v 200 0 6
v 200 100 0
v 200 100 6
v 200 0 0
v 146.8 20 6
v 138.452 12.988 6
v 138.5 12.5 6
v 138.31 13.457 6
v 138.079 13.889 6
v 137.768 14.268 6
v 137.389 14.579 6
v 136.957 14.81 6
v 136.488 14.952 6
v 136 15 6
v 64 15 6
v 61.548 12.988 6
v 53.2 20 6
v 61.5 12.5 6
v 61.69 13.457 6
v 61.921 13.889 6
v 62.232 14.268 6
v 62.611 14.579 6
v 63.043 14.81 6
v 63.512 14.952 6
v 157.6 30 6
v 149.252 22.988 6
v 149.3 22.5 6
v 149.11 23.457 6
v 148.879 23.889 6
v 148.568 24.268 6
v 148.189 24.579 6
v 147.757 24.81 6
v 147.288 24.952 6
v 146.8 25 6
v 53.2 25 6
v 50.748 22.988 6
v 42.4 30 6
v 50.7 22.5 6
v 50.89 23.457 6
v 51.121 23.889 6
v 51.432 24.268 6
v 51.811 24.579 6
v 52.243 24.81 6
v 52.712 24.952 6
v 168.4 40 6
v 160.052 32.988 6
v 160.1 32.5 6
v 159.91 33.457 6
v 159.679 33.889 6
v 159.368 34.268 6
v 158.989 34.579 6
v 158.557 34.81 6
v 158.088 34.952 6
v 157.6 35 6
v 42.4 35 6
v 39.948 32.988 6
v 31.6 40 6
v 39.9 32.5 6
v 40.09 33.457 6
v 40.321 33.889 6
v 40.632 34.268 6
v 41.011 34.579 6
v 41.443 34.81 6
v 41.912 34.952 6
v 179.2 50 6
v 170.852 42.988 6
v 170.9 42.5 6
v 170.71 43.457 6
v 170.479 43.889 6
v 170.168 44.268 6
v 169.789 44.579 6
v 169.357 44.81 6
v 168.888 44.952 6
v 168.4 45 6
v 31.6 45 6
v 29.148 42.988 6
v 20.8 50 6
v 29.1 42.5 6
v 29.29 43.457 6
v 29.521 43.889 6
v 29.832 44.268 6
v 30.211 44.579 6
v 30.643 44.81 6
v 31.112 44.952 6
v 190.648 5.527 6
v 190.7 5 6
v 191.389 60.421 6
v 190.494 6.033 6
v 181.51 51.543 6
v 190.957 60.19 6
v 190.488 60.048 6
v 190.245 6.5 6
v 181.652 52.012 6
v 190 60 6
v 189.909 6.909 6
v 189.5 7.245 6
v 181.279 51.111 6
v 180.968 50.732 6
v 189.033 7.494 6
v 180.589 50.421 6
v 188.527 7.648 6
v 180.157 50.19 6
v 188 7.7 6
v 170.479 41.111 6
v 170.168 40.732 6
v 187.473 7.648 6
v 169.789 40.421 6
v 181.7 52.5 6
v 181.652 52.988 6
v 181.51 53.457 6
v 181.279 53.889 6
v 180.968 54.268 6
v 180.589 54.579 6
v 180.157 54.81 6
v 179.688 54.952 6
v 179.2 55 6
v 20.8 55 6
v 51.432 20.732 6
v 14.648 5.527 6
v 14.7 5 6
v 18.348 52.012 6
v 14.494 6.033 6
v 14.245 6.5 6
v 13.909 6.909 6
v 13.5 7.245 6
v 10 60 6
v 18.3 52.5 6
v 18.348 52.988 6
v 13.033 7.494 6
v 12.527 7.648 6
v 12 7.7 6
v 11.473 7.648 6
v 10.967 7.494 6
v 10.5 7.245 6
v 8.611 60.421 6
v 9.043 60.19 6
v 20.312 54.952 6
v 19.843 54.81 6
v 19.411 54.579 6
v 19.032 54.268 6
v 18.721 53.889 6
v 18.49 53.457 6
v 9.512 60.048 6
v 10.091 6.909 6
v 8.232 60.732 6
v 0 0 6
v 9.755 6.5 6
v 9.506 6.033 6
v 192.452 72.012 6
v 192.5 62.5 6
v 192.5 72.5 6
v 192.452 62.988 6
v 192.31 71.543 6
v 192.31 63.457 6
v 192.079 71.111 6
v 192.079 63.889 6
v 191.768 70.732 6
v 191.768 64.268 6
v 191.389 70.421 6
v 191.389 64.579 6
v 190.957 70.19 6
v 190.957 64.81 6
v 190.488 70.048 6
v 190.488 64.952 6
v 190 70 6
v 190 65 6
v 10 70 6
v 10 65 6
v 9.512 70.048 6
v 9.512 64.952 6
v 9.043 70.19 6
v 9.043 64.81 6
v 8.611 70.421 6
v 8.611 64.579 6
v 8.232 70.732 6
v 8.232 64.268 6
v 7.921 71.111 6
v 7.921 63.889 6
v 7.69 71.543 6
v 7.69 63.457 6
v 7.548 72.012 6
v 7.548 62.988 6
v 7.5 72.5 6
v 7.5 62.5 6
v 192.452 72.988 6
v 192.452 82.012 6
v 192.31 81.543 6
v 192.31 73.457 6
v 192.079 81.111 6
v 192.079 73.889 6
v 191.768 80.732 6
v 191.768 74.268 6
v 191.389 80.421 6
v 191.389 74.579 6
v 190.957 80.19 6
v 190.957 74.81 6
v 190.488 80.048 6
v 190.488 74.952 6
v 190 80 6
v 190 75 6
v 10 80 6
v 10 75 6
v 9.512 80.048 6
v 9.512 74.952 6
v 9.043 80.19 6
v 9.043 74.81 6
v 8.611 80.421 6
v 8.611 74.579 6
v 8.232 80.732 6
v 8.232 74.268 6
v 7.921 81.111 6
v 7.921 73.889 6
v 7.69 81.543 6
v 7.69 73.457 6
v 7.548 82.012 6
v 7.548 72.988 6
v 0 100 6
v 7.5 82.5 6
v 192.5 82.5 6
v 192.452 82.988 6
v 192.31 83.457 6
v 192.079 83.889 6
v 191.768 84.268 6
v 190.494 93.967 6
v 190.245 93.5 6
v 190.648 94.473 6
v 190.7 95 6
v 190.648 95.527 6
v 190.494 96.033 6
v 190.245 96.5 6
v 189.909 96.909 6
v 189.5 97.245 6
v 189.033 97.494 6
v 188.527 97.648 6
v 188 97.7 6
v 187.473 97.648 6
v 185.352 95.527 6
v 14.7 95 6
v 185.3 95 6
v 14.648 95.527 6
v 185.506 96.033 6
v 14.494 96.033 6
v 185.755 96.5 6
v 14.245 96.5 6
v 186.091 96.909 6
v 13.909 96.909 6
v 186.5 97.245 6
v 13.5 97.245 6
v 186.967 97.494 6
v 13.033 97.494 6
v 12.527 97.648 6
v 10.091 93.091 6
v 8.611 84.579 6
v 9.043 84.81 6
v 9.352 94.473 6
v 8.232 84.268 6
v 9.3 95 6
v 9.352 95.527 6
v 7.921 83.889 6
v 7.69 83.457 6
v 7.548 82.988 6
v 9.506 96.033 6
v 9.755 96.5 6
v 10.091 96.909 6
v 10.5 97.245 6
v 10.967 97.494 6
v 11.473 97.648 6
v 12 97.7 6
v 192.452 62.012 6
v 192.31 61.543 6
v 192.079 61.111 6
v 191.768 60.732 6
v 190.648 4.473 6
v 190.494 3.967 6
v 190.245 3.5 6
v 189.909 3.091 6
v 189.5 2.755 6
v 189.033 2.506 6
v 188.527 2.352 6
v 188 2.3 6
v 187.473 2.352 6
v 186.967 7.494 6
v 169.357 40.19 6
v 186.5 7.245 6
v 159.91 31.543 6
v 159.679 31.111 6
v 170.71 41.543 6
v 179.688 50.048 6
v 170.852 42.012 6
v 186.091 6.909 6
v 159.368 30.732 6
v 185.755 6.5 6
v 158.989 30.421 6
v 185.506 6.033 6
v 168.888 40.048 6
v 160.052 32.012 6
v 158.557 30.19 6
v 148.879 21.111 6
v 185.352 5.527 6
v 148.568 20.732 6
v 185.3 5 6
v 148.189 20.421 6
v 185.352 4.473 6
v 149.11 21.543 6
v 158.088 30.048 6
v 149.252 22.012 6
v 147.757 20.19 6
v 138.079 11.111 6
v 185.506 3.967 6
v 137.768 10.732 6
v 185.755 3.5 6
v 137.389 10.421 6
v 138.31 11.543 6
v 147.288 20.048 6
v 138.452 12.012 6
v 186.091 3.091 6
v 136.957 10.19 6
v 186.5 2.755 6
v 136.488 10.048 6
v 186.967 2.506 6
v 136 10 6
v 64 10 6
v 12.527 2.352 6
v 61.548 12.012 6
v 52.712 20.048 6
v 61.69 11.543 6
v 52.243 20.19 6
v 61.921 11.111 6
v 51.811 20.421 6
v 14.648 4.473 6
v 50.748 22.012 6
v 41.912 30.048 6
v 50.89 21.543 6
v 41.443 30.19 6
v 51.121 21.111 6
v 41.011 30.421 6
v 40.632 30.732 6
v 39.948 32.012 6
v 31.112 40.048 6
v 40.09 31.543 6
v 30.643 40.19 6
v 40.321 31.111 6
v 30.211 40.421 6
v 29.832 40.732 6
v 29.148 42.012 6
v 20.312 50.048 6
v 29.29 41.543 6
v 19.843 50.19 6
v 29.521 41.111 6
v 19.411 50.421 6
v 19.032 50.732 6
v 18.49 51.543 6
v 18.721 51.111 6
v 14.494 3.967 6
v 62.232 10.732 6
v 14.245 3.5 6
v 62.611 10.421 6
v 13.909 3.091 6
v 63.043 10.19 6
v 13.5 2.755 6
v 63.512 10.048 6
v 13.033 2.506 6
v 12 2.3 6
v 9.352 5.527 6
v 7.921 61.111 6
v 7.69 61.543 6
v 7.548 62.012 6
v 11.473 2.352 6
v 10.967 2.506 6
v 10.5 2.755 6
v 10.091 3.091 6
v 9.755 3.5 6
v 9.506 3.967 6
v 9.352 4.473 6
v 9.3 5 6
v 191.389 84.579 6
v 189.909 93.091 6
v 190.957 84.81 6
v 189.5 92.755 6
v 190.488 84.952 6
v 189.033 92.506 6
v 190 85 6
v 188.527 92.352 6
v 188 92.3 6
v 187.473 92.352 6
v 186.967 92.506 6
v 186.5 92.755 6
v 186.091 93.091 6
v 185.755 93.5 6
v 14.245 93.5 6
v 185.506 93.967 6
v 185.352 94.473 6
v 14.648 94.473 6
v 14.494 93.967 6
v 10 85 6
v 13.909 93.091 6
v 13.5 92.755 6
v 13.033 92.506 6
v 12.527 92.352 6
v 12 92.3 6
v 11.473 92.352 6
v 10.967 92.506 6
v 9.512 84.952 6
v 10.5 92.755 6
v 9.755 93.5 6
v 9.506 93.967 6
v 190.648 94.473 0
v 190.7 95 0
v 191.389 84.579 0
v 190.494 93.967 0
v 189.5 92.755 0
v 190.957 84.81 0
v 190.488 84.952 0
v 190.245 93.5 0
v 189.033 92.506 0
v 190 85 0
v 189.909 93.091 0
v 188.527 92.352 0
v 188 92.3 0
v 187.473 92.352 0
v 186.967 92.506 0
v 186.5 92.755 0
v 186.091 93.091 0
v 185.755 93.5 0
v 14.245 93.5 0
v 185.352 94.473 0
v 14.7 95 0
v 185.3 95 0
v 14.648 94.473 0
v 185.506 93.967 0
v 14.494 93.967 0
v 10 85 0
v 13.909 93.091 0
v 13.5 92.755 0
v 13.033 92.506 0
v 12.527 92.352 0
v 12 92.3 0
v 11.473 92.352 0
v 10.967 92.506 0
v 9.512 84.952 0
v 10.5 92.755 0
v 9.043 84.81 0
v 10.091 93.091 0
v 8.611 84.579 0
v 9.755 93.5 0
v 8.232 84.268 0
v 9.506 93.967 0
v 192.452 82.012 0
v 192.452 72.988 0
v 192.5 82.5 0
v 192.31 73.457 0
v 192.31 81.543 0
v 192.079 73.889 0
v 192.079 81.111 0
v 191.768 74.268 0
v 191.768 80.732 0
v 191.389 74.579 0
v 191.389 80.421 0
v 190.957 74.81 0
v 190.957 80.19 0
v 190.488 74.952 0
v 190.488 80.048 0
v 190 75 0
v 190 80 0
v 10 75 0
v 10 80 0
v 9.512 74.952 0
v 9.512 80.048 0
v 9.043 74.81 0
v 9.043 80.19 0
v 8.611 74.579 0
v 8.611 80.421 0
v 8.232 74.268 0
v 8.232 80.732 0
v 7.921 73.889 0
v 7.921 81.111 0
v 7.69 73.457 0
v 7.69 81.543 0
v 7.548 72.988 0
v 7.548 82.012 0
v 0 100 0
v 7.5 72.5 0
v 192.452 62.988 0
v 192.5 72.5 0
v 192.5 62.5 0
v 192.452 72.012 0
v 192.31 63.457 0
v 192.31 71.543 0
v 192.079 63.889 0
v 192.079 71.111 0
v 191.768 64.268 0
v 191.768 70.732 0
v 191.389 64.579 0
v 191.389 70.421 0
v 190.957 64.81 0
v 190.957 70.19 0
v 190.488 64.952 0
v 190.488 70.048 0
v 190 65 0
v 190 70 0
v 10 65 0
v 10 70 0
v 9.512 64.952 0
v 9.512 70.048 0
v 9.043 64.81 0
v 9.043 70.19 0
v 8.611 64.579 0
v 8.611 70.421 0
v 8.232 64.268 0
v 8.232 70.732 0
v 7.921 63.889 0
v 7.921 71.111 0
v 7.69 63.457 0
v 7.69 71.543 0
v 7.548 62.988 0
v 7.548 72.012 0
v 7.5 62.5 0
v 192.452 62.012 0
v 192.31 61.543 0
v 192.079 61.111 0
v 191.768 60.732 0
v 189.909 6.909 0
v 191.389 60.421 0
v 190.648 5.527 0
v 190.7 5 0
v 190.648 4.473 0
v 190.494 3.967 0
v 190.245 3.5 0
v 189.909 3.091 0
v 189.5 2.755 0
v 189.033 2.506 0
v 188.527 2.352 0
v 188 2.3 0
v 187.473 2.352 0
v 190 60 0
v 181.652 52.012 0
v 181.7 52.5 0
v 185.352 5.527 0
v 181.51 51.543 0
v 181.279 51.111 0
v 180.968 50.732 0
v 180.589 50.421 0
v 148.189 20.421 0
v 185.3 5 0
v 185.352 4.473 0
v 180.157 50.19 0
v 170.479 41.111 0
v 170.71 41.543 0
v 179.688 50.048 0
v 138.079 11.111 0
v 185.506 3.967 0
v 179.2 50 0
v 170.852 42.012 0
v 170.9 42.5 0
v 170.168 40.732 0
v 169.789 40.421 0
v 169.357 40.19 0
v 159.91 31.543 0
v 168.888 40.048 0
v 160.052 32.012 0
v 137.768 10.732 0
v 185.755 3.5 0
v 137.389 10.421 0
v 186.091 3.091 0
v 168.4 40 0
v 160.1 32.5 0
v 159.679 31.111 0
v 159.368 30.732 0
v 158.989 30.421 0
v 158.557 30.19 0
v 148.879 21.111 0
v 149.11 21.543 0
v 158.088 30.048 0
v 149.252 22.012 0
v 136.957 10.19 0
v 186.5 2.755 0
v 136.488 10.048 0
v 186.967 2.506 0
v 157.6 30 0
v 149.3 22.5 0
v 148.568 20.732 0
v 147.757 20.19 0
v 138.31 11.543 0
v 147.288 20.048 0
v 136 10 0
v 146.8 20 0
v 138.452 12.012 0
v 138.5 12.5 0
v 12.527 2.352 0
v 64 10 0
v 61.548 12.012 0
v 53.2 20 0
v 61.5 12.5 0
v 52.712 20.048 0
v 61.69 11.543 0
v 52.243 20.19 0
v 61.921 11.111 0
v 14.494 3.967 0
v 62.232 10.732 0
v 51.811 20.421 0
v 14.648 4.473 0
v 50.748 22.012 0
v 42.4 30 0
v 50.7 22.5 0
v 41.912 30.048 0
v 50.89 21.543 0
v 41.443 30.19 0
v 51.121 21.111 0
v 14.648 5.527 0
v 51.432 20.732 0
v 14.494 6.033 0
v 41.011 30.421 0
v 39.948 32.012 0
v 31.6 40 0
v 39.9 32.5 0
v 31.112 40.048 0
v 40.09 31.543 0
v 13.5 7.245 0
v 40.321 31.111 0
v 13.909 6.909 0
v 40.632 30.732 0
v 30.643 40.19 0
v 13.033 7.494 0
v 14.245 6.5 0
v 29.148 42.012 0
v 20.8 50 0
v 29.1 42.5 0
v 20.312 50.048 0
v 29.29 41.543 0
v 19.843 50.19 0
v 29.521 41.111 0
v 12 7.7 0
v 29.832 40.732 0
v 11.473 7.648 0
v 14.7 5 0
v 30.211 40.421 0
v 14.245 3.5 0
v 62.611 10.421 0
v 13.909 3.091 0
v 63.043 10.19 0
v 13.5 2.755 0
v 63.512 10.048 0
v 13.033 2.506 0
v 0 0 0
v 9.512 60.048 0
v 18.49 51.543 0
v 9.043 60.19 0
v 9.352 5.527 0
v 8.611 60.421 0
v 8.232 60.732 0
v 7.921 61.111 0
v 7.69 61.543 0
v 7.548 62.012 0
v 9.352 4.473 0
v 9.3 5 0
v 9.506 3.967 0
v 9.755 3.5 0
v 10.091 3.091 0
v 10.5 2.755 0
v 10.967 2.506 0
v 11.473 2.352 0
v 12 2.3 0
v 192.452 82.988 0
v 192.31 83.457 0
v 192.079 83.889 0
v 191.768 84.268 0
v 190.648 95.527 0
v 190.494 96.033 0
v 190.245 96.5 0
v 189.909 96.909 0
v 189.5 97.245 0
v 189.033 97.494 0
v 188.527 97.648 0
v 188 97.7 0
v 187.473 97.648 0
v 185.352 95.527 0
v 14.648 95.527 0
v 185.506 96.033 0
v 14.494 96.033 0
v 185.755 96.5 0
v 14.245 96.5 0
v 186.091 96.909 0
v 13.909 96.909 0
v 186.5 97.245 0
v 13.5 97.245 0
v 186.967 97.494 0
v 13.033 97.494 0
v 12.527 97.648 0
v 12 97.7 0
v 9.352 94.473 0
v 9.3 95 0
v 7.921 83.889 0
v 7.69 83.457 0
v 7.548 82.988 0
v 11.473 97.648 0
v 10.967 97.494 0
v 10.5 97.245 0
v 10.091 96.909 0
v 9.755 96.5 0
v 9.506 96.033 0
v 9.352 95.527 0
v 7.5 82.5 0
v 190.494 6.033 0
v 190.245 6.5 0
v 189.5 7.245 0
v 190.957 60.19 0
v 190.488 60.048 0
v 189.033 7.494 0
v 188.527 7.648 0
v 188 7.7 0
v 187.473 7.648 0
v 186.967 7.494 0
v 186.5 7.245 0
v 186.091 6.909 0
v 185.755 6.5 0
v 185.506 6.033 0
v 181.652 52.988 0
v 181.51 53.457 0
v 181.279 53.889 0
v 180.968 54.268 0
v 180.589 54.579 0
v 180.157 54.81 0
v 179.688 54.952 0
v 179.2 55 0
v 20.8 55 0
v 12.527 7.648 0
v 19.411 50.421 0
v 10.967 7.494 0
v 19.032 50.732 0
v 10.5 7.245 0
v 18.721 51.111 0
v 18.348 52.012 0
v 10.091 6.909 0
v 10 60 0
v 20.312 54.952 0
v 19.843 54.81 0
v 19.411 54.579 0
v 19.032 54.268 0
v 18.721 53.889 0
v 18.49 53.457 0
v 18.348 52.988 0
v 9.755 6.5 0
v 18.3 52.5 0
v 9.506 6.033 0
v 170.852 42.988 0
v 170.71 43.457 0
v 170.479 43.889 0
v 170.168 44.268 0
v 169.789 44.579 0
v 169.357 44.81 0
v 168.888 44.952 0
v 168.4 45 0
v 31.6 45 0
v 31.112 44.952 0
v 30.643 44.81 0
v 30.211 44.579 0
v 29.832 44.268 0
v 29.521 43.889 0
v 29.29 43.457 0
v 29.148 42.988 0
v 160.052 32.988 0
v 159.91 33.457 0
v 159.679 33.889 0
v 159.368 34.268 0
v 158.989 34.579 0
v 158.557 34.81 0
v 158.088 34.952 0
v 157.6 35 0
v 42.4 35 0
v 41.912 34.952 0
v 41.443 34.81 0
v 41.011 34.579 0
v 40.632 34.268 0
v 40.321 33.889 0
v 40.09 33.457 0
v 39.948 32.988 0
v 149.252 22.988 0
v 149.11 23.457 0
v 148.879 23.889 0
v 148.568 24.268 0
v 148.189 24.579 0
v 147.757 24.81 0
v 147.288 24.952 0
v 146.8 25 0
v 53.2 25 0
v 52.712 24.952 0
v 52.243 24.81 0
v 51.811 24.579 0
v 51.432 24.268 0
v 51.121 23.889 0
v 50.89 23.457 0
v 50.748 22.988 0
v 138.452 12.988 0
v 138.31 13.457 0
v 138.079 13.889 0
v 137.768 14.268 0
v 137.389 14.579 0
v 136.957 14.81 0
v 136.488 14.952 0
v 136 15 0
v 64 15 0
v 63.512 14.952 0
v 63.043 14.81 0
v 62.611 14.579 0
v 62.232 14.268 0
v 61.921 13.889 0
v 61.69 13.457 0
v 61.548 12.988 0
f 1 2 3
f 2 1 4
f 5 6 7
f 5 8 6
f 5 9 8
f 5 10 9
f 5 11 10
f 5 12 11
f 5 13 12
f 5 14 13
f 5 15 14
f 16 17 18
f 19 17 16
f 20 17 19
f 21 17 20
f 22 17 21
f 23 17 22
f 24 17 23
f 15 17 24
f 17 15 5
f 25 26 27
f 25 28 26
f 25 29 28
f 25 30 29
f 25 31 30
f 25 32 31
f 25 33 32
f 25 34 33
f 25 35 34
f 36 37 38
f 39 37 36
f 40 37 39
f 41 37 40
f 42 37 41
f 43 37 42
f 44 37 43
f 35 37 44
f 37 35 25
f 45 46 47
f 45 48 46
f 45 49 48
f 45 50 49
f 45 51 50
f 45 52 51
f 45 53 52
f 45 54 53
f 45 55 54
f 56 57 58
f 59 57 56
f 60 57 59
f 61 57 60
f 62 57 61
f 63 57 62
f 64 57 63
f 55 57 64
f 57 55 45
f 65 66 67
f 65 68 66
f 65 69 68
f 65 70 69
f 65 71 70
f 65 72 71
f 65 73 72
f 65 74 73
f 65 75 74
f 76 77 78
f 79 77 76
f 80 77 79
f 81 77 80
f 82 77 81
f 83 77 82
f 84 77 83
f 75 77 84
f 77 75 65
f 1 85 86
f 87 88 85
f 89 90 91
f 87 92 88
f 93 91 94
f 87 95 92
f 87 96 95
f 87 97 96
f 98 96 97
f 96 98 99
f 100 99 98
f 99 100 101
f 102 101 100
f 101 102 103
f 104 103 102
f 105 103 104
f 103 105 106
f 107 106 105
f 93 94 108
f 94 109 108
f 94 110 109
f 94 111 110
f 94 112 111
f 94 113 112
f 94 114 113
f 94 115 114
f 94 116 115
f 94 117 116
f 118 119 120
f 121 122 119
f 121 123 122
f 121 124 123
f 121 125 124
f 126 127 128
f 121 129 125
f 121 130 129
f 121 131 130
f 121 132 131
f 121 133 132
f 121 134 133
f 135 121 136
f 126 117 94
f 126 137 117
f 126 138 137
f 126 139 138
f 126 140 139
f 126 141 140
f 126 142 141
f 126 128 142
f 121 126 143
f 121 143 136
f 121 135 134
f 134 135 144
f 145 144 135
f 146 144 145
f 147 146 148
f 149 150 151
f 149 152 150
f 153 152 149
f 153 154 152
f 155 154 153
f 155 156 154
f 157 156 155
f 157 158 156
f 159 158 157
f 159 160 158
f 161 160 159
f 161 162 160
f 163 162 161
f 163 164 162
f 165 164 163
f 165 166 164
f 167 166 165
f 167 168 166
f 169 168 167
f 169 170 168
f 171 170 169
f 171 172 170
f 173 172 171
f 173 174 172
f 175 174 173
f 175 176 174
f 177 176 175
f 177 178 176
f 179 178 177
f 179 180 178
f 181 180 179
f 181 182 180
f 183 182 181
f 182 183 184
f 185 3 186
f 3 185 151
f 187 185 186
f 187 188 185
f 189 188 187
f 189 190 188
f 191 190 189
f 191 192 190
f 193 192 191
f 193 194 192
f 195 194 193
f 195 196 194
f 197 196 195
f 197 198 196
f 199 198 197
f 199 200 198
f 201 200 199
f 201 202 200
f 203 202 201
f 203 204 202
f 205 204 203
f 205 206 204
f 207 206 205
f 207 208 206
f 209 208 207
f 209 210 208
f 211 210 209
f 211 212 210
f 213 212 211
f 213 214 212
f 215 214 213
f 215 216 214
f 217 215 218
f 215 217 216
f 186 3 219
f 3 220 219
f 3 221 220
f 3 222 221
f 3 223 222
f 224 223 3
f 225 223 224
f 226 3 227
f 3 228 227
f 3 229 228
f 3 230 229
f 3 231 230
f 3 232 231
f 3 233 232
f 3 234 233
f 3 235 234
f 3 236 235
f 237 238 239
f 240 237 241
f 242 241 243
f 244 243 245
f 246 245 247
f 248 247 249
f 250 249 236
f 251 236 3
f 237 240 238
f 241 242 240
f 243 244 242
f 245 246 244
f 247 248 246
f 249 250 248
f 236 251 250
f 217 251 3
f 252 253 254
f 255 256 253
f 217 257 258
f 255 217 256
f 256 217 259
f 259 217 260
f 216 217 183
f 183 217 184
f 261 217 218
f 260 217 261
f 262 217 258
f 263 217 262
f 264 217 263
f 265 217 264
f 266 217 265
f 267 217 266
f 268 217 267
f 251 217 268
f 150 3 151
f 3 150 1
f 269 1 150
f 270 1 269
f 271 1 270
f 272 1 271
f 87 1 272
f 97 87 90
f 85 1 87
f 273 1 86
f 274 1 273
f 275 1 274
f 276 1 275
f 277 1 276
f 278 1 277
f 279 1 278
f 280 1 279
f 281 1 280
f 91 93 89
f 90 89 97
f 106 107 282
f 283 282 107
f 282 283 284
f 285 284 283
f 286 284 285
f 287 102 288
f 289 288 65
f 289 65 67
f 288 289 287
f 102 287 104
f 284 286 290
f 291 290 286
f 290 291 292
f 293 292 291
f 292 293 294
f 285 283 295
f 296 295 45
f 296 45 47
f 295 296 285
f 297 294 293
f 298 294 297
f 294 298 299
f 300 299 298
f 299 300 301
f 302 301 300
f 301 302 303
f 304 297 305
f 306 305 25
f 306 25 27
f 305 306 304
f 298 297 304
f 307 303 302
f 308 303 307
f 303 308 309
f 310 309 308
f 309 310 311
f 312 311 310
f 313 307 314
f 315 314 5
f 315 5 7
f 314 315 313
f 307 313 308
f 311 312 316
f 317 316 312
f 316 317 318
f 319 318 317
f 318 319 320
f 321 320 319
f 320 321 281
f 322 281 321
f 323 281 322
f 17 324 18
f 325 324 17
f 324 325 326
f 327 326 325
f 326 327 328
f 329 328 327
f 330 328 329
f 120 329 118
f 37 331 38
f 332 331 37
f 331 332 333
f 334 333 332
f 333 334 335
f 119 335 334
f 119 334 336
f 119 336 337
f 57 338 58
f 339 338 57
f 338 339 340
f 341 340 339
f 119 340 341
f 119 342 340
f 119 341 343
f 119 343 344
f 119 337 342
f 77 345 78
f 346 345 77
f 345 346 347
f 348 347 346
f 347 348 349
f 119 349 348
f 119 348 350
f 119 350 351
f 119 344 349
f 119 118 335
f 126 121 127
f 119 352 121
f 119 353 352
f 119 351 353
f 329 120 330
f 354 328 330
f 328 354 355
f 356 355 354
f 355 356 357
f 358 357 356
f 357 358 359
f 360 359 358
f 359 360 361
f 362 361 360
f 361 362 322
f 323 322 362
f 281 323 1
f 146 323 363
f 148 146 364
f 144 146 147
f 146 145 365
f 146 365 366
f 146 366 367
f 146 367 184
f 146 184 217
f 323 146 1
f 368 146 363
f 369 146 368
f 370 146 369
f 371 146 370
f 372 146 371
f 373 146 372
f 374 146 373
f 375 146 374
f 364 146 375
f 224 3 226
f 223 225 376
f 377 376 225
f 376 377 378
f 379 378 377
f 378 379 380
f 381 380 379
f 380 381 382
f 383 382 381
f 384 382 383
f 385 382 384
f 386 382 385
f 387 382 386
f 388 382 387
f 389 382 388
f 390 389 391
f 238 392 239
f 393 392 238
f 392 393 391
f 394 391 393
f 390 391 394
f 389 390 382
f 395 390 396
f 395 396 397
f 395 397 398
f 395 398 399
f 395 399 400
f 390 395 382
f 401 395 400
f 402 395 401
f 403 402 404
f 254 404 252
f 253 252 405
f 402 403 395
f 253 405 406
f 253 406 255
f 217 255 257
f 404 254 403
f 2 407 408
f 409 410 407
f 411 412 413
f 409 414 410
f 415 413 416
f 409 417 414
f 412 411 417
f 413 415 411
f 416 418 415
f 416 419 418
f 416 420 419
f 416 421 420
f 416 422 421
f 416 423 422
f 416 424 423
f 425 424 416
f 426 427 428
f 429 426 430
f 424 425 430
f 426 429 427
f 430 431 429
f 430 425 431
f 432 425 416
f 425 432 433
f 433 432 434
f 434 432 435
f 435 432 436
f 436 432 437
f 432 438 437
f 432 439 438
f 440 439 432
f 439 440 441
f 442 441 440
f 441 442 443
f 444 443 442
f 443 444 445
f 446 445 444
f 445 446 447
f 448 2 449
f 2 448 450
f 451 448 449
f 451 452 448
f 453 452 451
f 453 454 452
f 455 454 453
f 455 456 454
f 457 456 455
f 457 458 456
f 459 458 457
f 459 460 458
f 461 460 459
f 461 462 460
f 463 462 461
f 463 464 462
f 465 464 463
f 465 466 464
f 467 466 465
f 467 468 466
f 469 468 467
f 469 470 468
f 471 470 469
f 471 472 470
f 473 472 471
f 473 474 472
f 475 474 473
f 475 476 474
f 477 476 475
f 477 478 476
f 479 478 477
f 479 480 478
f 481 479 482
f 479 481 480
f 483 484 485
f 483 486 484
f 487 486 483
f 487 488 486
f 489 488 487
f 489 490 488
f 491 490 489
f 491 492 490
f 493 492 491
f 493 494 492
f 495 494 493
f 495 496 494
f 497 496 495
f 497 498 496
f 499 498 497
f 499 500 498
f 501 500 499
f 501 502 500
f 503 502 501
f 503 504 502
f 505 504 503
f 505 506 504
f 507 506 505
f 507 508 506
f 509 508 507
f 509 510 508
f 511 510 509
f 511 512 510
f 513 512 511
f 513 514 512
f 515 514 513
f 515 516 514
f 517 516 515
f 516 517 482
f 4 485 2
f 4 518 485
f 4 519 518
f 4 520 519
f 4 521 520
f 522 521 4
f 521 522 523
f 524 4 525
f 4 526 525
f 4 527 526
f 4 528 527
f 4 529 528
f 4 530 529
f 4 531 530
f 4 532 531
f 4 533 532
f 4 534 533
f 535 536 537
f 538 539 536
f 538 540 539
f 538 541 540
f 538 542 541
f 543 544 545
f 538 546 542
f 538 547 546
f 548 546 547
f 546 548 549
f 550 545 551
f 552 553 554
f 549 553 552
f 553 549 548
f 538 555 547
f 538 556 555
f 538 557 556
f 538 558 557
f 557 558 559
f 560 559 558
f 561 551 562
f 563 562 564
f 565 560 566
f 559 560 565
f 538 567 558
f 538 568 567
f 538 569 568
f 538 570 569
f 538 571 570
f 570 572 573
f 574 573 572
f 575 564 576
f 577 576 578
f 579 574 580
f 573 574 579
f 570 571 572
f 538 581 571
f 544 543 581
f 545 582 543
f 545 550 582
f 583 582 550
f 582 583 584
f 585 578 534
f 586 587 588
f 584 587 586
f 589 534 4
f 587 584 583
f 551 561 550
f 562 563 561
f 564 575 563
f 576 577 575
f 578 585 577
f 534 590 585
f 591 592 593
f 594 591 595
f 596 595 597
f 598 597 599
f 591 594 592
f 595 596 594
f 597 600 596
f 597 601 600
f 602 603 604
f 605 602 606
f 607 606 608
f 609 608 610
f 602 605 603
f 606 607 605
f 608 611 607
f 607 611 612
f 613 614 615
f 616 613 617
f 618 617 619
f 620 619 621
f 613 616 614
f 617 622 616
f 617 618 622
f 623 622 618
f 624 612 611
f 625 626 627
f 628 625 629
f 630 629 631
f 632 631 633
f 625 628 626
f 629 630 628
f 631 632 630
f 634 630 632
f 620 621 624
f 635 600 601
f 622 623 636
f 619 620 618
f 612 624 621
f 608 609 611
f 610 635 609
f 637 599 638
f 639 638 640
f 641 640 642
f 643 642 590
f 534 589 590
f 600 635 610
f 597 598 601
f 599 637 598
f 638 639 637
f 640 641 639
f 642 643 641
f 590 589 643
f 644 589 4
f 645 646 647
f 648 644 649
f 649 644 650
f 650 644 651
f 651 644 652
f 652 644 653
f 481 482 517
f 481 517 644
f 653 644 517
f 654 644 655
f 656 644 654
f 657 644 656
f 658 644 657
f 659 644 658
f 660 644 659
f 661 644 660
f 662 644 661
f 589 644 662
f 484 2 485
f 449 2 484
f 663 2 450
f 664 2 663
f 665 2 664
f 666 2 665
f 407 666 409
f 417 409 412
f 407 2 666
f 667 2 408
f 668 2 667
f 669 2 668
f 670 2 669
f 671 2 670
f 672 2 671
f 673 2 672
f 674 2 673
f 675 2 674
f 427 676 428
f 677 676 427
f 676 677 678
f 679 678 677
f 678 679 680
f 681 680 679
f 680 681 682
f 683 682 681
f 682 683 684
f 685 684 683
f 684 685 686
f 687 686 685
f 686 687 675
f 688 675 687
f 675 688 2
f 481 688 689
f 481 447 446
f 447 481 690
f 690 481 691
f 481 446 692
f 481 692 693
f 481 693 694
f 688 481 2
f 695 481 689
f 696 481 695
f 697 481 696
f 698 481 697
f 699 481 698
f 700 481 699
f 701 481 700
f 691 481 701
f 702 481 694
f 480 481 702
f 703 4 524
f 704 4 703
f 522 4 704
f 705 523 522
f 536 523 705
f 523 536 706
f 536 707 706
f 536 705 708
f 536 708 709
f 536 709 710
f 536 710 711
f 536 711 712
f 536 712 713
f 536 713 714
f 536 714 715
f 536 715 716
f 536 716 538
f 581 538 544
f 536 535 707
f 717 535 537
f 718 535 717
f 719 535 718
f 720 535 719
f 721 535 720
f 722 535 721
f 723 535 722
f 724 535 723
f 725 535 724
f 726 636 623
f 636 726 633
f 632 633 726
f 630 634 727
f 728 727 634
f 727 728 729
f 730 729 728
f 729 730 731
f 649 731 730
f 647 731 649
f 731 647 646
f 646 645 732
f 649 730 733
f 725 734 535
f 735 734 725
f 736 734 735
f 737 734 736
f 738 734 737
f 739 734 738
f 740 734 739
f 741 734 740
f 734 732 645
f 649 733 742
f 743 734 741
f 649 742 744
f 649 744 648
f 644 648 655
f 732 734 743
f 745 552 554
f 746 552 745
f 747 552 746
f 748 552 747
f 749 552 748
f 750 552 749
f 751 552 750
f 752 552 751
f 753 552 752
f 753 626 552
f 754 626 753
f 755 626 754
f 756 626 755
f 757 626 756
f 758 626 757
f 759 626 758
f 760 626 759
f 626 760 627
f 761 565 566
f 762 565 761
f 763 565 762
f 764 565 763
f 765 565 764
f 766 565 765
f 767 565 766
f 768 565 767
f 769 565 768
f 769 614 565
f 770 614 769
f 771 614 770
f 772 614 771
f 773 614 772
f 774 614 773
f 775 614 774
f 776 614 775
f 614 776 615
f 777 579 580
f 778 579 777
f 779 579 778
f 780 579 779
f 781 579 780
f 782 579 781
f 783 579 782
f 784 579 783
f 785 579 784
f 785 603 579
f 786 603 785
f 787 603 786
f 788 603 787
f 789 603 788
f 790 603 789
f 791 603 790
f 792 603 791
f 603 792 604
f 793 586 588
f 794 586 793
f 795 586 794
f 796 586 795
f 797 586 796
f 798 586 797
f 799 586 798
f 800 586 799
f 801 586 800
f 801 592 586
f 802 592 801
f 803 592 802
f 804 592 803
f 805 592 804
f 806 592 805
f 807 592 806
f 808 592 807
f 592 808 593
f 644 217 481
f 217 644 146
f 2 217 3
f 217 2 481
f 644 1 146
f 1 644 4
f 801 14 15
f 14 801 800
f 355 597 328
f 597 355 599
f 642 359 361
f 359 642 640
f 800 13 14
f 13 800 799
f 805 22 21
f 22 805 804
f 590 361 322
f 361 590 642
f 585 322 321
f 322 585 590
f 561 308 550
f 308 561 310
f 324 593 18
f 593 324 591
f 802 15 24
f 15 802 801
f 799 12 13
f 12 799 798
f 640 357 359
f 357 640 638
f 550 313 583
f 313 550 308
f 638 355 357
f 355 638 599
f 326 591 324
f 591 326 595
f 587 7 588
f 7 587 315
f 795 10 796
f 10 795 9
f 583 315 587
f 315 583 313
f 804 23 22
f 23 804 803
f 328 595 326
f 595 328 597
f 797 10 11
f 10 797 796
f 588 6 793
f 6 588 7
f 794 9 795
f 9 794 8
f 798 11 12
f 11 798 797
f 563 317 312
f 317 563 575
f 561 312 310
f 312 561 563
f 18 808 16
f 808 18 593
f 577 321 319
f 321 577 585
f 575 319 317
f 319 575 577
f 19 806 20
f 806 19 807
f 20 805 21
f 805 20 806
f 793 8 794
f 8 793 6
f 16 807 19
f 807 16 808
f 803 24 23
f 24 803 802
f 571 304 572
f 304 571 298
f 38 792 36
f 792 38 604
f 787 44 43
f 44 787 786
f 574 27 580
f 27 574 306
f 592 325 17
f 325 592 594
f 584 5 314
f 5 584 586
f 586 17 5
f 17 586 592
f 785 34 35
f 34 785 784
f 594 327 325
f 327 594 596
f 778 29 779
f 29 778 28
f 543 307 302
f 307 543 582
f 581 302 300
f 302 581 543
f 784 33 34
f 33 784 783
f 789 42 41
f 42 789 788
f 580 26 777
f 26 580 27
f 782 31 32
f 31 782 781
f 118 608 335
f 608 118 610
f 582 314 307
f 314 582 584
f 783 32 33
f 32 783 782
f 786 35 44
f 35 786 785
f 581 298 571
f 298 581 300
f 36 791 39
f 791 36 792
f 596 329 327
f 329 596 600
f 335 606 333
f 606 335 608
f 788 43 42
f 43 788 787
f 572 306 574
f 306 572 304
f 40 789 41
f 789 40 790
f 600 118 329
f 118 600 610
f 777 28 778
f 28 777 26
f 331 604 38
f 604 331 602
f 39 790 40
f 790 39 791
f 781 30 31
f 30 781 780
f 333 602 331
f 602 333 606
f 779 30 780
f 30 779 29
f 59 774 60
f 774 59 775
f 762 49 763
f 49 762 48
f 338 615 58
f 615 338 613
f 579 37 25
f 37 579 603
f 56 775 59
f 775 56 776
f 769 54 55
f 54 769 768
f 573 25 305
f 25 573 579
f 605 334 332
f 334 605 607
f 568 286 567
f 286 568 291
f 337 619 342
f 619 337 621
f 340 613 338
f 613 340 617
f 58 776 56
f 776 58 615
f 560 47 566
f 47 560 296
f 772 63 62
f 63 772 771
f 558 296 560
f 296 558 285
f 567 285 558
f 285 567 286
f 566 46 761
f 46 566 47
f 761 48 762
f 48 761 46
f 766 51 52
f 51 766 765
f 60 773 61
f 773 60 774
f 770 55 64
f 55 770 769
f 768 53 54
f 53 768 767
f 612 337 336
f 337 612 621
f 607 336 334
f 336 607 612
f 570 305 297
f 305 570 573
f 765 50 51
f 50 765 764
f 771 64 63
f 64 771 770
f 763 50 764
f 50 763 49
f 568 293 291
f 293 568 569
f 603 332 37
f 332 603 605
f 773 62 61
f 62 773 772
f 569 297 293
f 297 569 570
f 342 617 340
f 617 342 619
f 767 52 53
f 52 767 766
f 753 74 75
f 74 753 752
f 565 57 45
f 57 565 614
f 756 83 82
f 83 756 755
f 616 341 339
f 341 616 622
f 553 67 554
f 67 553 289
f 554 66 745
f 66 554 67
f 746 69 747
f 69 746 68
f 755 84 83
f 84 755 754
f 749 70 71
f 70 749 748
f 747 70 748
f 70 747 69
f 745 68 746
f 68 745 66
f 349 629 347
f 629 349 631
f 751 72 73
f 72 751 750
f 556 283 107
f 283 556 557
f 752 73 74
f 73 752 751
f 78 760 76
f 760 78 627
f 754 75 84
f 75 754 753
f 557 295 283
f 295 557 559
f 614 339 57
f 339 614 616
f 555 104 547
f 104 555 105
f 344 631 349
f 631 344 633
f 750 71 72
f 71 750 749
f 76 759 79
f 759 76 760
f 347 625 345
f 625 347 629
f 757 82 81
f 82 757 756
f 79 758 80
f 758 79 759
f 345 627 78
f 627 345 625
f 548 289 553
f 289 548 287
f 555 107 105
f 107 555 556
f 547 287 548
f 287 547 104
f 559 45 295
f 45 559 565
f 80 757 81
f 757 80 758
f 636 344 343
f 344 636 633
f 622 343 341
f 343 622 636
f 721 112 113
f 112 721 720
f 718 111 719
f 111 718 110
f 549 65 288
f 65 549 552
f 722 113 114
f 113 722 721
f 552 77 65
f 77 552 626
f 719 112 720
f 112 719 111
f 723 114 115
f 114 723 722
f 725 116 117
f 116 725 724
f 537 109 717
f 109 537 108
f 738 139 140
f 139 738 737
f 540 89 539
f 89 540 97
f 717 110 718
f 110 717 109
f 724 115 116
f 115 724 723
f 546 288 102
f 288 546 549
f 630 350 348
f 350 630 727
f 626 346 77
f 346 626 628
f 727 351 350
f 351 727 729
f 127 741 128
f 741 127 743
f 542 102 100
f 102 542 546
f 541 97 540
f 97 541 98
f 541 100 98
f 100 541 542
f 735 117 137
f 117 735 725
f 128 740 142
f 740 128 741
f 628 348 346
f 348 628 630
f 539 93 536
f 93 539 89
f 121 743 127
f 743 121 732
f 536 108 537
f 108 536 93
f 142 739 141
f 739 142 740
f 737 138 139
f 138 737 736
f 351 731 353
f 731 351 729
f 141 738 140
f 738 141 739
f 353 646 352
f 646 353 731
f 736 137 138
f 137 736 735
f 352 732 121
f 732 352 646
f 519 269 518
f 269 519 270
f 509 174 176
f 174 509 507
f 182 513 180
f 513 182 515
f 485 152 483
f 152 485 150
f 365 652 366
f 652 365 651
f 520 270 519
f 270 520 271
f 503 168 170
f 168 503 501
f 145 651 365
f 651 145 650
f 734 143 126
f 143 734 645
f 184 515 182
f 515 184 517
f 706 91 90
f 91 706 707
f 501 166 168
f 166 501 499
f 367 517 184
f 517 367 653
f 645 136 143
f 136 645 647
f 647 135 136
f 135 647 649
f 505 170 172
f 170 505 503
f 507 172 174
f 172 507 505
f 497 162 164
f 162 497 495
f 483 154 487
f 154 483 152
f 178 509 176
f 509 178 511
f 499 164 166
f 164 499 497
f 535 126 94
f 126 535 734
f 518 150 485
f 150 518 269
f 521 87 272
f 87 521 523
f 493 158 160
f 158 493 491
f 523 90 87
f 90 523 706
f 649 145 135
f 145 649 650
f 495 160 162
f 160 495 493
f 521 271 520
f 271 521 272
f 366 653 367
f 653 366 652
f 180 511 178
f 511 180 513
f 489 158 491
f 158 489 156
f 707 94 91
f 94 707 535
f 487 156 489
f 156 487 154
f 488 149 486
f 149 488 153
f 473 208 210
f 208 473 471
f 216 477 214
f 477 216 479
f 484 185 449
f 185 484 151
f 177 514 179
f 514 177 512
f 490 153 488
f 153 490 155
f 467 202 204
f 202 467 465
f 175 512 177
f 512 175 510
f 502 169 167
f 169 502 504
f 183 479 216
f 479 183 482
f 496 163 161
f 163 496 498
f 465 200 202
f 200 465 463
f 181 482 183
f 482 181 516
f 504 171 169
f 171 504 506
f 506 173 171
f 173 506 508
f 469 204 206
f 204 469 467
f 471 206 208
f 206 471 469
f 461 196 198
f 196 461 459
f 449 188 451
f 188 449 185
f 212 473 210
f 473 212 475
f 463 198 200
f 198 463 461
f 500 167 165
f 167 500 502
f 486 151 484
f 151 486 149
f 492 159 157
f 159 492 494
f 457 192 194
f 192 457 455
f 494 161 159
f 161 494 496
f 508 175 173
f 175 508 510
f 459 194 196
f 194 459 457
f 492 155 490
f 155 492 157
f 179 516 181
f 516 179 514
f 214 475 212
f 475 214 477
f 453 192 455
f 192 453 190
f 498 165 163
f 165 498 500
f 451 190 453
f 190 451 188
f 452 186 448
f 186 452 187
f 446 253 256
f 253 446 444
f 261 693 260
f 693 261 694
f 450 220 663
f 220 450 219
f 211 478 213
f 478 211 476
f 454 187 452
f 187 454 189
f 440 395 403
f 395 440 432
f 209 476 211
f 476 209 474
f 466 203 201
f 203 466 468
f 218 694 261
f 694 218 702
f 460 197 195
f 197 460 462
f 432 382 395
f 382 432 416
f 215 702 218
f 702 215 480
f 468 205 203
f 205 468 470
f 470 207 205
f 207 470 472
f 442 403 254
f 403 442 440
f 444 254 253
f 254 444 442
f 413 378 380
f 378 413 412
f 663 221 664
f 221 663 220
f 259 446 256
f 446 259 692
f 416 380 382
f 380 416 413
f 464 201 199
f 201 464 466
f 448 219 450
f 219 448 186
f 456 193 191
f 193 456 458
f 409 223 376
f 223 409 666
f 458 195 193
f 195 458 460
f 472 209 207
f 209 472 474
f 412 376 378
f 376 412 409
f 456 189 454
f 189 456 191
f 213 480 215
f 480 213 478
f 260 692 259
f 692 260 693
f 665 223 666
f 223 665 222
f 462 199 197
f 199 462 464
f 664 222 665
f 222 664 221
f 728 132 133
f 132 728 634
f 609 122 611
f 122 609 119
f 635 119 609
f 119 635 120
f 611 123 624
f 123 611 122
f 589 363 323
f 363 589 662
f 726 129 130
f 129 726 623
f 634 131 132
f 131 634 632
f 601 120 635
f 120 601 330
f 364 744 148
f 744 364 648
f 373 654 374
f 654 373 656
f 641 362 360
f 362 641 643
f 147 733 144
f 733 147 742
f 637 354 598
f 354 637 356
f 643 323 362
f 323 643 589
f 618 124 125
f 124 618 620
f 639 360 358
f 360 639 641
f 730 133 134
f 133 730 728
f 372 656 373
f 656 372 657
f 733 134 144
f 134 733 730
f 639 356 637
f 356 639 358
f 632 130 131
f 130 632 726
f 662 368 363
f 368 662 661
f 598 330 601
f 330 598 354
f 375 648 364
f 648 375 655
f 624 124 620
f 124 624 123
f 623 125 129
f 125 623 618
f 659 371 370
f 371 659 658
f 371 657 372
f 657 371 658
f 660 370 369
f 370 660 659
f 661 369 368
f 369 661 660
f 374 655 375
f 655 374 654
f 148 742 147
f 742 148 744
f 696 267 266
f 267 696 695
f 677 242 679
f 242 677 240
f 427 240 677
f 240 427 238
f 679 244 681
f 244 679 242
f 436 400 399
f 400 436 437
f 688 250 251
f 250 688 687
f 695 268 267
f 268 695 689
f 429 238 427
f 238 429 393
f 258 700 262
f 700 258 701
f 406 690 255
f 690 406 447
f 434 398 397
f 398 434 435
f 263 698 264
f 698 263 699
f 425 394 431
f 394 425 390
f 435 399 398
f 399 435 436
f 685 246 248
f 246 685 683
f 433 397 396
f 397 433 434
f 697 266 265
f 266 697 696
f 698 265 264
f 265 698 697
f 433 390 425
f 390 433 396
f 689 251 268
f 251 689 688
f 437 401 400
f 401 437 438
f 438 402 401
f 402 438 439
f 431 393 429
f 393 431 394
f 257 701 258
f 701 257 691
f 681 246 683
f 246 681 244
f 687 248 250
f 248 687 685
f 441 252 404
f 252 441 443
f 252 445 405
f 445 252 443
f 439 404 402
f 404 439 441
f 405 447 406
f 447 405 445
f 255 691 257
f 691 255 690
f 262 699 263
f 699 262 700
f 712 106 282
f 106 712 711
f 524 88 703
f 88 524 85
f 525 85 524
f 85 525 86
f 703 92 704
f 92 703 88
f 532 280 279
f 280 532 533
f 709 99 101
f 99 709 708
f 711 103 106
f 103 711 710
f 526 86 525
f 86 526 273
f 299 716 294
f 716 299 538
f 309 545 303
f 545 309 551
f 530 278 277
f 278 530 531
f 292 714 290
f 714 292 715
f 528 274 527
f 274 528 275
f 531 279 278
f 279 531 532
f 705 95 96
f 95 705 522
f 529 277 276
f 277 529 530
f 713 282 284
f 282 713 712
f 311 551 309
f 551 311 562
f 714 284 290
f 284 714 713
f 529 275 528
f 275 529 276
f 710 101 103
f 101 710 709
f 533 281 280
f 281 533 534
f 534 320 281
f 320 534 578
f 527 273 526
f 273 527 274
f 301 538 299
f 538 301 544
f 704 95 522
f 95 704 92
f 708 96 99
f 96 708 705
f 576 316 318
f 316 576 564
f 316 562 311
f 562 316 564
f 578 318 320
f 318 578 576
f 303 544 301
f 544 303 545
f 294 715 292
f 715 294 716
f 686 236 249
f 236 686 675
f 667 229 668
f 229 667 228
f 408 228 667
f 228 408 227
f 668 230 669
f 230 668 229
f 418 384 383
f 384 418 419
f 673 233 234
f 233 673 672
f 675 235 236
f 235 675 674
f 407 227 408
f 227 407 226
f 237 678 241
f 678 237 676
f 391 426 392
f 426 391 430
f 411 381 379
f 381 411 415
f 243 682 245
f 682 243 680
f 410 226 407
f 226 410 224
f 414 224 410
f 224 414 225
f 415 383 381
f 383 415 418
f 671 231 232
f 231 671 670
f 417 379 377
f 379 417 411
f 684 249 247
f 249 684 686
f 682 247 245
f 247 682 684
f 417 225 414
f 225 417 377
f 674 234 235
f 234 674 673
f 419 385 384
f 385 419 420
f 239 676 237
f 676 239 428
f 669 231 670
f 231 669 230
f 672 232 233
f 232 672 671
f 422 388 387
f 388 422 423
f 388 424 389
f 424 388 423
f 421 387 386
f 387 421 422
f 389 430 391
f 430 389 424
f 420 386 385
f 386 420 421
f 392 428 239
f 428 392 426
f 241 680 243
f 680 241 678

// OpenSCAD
$fn = 32;

// ----------------------------------------------------------------------
// Slotted panel: 200 x 100 mm, 8 рядов of slots
// ----------------------------------------------------------------------

// --- parameters (mm) ---
panel_w = 200;            // panel width
panel_d = 100;            // panel depth
thick = 6;                // panel thickness
slot_w = 5;               // slot width
pitch0 = 10;              // first row pitch
pitch_step = 1.2;         // pitch increase per row
margin = 10;              // margin around the slot field
rows = 8;                 // number of slot rows
mount_d = 5.4;            // mounting holes
mount_x = 88;             // mounting hole offset

difference() {
  union() {
    cube([panel_w, panel_d, thick]);
  }
  /* slot rows: stadium shaped cutters, 2.5 mm clear of both faces */
  /* row 0: pitch 10, length 72 */
  hull() {
    translate([64, 12.5, -2.5]) cylinder(h = thick + 5, d = slot_w);
    translate([136, 12.5, -2.5]) cylinder(h = thick + 5, d = slot_w);
  }
  /* row 1: pitch 10, length 93.6 */
  hull() {
    translate([53.2, 22.5, -2.5]) cylinder(h = thick + 5, d = slot_w);
    translate([146.8, 22.5, -2.5]) cylinder(h = thick + 5, d = slot_w);
  }
  /* row 2: pitch 10, length 115.2 */
  hull() {
    translate([42.4, 32.5, -2.5]) cylinder(h = thick + 5, d = slot_w);
    translate([157.6, 32.5, -2.5]) cylinder(h = thick + 5, d = slot_w);
  }
  /* row 3: pitch 10, length 136.8 */
  hull() {
    translate([31.6, 42.5, -2.5]) cylinder(h = thick + 5, d = slot_w);
    translate([168.4, 42.5, -2.5]) cylinder(h = thick + 5, d = slot_w);
  }
  /* row 4: pitch 10, length 158.4 */
  hull() {
    translate([20.8, 52.5, -2.5]) cylinder(h = thick + 5, d = slot_w);
    translate([179.2, 52.5, -2.5]) cylinder(h = thick + 5, d = slot_w);
  }
  /* row 5: pitch 10, length 180 */
  hull() {
    translate([10, 62.5, -2.5]) cylinder(h = thick + 5, d = slot_w);
    translate([190, 62.5, -2.5]) cylinder(h = thick + 5, d = slot_w);
  }
  /* row 6: pitch 10, length 180 */
  hull() {
    translate([10, 72.5, -2.5]) cylinder(h = thick + 5, d = slot_w);
    translate([190, 72.5, -2.5]) cylinder(h = thick + 5, d = slot_w);
  }
  /* row 7: pitch 10, length 180 */
  hull() {
    translate([10, 82.5, -2.5]) cylinder(h = thick + 5, d = slot_w);
    translate([190, 82.5, -2.5]) cylinder(h = thick + 5, d = slot_w);
  }
  translate([12, 5, -2.5]) cylinder(h = 11, d = mount_d);
  translate([12, 95, -2.5]) cylinder(h = 11, d = mount_d);
  translate([188, 5, -2.5]) cylinder(h = 11, d = mount_d);
  translate([188, 95, -2.5]) cylinder(h = 11, d = mount_d);
}
